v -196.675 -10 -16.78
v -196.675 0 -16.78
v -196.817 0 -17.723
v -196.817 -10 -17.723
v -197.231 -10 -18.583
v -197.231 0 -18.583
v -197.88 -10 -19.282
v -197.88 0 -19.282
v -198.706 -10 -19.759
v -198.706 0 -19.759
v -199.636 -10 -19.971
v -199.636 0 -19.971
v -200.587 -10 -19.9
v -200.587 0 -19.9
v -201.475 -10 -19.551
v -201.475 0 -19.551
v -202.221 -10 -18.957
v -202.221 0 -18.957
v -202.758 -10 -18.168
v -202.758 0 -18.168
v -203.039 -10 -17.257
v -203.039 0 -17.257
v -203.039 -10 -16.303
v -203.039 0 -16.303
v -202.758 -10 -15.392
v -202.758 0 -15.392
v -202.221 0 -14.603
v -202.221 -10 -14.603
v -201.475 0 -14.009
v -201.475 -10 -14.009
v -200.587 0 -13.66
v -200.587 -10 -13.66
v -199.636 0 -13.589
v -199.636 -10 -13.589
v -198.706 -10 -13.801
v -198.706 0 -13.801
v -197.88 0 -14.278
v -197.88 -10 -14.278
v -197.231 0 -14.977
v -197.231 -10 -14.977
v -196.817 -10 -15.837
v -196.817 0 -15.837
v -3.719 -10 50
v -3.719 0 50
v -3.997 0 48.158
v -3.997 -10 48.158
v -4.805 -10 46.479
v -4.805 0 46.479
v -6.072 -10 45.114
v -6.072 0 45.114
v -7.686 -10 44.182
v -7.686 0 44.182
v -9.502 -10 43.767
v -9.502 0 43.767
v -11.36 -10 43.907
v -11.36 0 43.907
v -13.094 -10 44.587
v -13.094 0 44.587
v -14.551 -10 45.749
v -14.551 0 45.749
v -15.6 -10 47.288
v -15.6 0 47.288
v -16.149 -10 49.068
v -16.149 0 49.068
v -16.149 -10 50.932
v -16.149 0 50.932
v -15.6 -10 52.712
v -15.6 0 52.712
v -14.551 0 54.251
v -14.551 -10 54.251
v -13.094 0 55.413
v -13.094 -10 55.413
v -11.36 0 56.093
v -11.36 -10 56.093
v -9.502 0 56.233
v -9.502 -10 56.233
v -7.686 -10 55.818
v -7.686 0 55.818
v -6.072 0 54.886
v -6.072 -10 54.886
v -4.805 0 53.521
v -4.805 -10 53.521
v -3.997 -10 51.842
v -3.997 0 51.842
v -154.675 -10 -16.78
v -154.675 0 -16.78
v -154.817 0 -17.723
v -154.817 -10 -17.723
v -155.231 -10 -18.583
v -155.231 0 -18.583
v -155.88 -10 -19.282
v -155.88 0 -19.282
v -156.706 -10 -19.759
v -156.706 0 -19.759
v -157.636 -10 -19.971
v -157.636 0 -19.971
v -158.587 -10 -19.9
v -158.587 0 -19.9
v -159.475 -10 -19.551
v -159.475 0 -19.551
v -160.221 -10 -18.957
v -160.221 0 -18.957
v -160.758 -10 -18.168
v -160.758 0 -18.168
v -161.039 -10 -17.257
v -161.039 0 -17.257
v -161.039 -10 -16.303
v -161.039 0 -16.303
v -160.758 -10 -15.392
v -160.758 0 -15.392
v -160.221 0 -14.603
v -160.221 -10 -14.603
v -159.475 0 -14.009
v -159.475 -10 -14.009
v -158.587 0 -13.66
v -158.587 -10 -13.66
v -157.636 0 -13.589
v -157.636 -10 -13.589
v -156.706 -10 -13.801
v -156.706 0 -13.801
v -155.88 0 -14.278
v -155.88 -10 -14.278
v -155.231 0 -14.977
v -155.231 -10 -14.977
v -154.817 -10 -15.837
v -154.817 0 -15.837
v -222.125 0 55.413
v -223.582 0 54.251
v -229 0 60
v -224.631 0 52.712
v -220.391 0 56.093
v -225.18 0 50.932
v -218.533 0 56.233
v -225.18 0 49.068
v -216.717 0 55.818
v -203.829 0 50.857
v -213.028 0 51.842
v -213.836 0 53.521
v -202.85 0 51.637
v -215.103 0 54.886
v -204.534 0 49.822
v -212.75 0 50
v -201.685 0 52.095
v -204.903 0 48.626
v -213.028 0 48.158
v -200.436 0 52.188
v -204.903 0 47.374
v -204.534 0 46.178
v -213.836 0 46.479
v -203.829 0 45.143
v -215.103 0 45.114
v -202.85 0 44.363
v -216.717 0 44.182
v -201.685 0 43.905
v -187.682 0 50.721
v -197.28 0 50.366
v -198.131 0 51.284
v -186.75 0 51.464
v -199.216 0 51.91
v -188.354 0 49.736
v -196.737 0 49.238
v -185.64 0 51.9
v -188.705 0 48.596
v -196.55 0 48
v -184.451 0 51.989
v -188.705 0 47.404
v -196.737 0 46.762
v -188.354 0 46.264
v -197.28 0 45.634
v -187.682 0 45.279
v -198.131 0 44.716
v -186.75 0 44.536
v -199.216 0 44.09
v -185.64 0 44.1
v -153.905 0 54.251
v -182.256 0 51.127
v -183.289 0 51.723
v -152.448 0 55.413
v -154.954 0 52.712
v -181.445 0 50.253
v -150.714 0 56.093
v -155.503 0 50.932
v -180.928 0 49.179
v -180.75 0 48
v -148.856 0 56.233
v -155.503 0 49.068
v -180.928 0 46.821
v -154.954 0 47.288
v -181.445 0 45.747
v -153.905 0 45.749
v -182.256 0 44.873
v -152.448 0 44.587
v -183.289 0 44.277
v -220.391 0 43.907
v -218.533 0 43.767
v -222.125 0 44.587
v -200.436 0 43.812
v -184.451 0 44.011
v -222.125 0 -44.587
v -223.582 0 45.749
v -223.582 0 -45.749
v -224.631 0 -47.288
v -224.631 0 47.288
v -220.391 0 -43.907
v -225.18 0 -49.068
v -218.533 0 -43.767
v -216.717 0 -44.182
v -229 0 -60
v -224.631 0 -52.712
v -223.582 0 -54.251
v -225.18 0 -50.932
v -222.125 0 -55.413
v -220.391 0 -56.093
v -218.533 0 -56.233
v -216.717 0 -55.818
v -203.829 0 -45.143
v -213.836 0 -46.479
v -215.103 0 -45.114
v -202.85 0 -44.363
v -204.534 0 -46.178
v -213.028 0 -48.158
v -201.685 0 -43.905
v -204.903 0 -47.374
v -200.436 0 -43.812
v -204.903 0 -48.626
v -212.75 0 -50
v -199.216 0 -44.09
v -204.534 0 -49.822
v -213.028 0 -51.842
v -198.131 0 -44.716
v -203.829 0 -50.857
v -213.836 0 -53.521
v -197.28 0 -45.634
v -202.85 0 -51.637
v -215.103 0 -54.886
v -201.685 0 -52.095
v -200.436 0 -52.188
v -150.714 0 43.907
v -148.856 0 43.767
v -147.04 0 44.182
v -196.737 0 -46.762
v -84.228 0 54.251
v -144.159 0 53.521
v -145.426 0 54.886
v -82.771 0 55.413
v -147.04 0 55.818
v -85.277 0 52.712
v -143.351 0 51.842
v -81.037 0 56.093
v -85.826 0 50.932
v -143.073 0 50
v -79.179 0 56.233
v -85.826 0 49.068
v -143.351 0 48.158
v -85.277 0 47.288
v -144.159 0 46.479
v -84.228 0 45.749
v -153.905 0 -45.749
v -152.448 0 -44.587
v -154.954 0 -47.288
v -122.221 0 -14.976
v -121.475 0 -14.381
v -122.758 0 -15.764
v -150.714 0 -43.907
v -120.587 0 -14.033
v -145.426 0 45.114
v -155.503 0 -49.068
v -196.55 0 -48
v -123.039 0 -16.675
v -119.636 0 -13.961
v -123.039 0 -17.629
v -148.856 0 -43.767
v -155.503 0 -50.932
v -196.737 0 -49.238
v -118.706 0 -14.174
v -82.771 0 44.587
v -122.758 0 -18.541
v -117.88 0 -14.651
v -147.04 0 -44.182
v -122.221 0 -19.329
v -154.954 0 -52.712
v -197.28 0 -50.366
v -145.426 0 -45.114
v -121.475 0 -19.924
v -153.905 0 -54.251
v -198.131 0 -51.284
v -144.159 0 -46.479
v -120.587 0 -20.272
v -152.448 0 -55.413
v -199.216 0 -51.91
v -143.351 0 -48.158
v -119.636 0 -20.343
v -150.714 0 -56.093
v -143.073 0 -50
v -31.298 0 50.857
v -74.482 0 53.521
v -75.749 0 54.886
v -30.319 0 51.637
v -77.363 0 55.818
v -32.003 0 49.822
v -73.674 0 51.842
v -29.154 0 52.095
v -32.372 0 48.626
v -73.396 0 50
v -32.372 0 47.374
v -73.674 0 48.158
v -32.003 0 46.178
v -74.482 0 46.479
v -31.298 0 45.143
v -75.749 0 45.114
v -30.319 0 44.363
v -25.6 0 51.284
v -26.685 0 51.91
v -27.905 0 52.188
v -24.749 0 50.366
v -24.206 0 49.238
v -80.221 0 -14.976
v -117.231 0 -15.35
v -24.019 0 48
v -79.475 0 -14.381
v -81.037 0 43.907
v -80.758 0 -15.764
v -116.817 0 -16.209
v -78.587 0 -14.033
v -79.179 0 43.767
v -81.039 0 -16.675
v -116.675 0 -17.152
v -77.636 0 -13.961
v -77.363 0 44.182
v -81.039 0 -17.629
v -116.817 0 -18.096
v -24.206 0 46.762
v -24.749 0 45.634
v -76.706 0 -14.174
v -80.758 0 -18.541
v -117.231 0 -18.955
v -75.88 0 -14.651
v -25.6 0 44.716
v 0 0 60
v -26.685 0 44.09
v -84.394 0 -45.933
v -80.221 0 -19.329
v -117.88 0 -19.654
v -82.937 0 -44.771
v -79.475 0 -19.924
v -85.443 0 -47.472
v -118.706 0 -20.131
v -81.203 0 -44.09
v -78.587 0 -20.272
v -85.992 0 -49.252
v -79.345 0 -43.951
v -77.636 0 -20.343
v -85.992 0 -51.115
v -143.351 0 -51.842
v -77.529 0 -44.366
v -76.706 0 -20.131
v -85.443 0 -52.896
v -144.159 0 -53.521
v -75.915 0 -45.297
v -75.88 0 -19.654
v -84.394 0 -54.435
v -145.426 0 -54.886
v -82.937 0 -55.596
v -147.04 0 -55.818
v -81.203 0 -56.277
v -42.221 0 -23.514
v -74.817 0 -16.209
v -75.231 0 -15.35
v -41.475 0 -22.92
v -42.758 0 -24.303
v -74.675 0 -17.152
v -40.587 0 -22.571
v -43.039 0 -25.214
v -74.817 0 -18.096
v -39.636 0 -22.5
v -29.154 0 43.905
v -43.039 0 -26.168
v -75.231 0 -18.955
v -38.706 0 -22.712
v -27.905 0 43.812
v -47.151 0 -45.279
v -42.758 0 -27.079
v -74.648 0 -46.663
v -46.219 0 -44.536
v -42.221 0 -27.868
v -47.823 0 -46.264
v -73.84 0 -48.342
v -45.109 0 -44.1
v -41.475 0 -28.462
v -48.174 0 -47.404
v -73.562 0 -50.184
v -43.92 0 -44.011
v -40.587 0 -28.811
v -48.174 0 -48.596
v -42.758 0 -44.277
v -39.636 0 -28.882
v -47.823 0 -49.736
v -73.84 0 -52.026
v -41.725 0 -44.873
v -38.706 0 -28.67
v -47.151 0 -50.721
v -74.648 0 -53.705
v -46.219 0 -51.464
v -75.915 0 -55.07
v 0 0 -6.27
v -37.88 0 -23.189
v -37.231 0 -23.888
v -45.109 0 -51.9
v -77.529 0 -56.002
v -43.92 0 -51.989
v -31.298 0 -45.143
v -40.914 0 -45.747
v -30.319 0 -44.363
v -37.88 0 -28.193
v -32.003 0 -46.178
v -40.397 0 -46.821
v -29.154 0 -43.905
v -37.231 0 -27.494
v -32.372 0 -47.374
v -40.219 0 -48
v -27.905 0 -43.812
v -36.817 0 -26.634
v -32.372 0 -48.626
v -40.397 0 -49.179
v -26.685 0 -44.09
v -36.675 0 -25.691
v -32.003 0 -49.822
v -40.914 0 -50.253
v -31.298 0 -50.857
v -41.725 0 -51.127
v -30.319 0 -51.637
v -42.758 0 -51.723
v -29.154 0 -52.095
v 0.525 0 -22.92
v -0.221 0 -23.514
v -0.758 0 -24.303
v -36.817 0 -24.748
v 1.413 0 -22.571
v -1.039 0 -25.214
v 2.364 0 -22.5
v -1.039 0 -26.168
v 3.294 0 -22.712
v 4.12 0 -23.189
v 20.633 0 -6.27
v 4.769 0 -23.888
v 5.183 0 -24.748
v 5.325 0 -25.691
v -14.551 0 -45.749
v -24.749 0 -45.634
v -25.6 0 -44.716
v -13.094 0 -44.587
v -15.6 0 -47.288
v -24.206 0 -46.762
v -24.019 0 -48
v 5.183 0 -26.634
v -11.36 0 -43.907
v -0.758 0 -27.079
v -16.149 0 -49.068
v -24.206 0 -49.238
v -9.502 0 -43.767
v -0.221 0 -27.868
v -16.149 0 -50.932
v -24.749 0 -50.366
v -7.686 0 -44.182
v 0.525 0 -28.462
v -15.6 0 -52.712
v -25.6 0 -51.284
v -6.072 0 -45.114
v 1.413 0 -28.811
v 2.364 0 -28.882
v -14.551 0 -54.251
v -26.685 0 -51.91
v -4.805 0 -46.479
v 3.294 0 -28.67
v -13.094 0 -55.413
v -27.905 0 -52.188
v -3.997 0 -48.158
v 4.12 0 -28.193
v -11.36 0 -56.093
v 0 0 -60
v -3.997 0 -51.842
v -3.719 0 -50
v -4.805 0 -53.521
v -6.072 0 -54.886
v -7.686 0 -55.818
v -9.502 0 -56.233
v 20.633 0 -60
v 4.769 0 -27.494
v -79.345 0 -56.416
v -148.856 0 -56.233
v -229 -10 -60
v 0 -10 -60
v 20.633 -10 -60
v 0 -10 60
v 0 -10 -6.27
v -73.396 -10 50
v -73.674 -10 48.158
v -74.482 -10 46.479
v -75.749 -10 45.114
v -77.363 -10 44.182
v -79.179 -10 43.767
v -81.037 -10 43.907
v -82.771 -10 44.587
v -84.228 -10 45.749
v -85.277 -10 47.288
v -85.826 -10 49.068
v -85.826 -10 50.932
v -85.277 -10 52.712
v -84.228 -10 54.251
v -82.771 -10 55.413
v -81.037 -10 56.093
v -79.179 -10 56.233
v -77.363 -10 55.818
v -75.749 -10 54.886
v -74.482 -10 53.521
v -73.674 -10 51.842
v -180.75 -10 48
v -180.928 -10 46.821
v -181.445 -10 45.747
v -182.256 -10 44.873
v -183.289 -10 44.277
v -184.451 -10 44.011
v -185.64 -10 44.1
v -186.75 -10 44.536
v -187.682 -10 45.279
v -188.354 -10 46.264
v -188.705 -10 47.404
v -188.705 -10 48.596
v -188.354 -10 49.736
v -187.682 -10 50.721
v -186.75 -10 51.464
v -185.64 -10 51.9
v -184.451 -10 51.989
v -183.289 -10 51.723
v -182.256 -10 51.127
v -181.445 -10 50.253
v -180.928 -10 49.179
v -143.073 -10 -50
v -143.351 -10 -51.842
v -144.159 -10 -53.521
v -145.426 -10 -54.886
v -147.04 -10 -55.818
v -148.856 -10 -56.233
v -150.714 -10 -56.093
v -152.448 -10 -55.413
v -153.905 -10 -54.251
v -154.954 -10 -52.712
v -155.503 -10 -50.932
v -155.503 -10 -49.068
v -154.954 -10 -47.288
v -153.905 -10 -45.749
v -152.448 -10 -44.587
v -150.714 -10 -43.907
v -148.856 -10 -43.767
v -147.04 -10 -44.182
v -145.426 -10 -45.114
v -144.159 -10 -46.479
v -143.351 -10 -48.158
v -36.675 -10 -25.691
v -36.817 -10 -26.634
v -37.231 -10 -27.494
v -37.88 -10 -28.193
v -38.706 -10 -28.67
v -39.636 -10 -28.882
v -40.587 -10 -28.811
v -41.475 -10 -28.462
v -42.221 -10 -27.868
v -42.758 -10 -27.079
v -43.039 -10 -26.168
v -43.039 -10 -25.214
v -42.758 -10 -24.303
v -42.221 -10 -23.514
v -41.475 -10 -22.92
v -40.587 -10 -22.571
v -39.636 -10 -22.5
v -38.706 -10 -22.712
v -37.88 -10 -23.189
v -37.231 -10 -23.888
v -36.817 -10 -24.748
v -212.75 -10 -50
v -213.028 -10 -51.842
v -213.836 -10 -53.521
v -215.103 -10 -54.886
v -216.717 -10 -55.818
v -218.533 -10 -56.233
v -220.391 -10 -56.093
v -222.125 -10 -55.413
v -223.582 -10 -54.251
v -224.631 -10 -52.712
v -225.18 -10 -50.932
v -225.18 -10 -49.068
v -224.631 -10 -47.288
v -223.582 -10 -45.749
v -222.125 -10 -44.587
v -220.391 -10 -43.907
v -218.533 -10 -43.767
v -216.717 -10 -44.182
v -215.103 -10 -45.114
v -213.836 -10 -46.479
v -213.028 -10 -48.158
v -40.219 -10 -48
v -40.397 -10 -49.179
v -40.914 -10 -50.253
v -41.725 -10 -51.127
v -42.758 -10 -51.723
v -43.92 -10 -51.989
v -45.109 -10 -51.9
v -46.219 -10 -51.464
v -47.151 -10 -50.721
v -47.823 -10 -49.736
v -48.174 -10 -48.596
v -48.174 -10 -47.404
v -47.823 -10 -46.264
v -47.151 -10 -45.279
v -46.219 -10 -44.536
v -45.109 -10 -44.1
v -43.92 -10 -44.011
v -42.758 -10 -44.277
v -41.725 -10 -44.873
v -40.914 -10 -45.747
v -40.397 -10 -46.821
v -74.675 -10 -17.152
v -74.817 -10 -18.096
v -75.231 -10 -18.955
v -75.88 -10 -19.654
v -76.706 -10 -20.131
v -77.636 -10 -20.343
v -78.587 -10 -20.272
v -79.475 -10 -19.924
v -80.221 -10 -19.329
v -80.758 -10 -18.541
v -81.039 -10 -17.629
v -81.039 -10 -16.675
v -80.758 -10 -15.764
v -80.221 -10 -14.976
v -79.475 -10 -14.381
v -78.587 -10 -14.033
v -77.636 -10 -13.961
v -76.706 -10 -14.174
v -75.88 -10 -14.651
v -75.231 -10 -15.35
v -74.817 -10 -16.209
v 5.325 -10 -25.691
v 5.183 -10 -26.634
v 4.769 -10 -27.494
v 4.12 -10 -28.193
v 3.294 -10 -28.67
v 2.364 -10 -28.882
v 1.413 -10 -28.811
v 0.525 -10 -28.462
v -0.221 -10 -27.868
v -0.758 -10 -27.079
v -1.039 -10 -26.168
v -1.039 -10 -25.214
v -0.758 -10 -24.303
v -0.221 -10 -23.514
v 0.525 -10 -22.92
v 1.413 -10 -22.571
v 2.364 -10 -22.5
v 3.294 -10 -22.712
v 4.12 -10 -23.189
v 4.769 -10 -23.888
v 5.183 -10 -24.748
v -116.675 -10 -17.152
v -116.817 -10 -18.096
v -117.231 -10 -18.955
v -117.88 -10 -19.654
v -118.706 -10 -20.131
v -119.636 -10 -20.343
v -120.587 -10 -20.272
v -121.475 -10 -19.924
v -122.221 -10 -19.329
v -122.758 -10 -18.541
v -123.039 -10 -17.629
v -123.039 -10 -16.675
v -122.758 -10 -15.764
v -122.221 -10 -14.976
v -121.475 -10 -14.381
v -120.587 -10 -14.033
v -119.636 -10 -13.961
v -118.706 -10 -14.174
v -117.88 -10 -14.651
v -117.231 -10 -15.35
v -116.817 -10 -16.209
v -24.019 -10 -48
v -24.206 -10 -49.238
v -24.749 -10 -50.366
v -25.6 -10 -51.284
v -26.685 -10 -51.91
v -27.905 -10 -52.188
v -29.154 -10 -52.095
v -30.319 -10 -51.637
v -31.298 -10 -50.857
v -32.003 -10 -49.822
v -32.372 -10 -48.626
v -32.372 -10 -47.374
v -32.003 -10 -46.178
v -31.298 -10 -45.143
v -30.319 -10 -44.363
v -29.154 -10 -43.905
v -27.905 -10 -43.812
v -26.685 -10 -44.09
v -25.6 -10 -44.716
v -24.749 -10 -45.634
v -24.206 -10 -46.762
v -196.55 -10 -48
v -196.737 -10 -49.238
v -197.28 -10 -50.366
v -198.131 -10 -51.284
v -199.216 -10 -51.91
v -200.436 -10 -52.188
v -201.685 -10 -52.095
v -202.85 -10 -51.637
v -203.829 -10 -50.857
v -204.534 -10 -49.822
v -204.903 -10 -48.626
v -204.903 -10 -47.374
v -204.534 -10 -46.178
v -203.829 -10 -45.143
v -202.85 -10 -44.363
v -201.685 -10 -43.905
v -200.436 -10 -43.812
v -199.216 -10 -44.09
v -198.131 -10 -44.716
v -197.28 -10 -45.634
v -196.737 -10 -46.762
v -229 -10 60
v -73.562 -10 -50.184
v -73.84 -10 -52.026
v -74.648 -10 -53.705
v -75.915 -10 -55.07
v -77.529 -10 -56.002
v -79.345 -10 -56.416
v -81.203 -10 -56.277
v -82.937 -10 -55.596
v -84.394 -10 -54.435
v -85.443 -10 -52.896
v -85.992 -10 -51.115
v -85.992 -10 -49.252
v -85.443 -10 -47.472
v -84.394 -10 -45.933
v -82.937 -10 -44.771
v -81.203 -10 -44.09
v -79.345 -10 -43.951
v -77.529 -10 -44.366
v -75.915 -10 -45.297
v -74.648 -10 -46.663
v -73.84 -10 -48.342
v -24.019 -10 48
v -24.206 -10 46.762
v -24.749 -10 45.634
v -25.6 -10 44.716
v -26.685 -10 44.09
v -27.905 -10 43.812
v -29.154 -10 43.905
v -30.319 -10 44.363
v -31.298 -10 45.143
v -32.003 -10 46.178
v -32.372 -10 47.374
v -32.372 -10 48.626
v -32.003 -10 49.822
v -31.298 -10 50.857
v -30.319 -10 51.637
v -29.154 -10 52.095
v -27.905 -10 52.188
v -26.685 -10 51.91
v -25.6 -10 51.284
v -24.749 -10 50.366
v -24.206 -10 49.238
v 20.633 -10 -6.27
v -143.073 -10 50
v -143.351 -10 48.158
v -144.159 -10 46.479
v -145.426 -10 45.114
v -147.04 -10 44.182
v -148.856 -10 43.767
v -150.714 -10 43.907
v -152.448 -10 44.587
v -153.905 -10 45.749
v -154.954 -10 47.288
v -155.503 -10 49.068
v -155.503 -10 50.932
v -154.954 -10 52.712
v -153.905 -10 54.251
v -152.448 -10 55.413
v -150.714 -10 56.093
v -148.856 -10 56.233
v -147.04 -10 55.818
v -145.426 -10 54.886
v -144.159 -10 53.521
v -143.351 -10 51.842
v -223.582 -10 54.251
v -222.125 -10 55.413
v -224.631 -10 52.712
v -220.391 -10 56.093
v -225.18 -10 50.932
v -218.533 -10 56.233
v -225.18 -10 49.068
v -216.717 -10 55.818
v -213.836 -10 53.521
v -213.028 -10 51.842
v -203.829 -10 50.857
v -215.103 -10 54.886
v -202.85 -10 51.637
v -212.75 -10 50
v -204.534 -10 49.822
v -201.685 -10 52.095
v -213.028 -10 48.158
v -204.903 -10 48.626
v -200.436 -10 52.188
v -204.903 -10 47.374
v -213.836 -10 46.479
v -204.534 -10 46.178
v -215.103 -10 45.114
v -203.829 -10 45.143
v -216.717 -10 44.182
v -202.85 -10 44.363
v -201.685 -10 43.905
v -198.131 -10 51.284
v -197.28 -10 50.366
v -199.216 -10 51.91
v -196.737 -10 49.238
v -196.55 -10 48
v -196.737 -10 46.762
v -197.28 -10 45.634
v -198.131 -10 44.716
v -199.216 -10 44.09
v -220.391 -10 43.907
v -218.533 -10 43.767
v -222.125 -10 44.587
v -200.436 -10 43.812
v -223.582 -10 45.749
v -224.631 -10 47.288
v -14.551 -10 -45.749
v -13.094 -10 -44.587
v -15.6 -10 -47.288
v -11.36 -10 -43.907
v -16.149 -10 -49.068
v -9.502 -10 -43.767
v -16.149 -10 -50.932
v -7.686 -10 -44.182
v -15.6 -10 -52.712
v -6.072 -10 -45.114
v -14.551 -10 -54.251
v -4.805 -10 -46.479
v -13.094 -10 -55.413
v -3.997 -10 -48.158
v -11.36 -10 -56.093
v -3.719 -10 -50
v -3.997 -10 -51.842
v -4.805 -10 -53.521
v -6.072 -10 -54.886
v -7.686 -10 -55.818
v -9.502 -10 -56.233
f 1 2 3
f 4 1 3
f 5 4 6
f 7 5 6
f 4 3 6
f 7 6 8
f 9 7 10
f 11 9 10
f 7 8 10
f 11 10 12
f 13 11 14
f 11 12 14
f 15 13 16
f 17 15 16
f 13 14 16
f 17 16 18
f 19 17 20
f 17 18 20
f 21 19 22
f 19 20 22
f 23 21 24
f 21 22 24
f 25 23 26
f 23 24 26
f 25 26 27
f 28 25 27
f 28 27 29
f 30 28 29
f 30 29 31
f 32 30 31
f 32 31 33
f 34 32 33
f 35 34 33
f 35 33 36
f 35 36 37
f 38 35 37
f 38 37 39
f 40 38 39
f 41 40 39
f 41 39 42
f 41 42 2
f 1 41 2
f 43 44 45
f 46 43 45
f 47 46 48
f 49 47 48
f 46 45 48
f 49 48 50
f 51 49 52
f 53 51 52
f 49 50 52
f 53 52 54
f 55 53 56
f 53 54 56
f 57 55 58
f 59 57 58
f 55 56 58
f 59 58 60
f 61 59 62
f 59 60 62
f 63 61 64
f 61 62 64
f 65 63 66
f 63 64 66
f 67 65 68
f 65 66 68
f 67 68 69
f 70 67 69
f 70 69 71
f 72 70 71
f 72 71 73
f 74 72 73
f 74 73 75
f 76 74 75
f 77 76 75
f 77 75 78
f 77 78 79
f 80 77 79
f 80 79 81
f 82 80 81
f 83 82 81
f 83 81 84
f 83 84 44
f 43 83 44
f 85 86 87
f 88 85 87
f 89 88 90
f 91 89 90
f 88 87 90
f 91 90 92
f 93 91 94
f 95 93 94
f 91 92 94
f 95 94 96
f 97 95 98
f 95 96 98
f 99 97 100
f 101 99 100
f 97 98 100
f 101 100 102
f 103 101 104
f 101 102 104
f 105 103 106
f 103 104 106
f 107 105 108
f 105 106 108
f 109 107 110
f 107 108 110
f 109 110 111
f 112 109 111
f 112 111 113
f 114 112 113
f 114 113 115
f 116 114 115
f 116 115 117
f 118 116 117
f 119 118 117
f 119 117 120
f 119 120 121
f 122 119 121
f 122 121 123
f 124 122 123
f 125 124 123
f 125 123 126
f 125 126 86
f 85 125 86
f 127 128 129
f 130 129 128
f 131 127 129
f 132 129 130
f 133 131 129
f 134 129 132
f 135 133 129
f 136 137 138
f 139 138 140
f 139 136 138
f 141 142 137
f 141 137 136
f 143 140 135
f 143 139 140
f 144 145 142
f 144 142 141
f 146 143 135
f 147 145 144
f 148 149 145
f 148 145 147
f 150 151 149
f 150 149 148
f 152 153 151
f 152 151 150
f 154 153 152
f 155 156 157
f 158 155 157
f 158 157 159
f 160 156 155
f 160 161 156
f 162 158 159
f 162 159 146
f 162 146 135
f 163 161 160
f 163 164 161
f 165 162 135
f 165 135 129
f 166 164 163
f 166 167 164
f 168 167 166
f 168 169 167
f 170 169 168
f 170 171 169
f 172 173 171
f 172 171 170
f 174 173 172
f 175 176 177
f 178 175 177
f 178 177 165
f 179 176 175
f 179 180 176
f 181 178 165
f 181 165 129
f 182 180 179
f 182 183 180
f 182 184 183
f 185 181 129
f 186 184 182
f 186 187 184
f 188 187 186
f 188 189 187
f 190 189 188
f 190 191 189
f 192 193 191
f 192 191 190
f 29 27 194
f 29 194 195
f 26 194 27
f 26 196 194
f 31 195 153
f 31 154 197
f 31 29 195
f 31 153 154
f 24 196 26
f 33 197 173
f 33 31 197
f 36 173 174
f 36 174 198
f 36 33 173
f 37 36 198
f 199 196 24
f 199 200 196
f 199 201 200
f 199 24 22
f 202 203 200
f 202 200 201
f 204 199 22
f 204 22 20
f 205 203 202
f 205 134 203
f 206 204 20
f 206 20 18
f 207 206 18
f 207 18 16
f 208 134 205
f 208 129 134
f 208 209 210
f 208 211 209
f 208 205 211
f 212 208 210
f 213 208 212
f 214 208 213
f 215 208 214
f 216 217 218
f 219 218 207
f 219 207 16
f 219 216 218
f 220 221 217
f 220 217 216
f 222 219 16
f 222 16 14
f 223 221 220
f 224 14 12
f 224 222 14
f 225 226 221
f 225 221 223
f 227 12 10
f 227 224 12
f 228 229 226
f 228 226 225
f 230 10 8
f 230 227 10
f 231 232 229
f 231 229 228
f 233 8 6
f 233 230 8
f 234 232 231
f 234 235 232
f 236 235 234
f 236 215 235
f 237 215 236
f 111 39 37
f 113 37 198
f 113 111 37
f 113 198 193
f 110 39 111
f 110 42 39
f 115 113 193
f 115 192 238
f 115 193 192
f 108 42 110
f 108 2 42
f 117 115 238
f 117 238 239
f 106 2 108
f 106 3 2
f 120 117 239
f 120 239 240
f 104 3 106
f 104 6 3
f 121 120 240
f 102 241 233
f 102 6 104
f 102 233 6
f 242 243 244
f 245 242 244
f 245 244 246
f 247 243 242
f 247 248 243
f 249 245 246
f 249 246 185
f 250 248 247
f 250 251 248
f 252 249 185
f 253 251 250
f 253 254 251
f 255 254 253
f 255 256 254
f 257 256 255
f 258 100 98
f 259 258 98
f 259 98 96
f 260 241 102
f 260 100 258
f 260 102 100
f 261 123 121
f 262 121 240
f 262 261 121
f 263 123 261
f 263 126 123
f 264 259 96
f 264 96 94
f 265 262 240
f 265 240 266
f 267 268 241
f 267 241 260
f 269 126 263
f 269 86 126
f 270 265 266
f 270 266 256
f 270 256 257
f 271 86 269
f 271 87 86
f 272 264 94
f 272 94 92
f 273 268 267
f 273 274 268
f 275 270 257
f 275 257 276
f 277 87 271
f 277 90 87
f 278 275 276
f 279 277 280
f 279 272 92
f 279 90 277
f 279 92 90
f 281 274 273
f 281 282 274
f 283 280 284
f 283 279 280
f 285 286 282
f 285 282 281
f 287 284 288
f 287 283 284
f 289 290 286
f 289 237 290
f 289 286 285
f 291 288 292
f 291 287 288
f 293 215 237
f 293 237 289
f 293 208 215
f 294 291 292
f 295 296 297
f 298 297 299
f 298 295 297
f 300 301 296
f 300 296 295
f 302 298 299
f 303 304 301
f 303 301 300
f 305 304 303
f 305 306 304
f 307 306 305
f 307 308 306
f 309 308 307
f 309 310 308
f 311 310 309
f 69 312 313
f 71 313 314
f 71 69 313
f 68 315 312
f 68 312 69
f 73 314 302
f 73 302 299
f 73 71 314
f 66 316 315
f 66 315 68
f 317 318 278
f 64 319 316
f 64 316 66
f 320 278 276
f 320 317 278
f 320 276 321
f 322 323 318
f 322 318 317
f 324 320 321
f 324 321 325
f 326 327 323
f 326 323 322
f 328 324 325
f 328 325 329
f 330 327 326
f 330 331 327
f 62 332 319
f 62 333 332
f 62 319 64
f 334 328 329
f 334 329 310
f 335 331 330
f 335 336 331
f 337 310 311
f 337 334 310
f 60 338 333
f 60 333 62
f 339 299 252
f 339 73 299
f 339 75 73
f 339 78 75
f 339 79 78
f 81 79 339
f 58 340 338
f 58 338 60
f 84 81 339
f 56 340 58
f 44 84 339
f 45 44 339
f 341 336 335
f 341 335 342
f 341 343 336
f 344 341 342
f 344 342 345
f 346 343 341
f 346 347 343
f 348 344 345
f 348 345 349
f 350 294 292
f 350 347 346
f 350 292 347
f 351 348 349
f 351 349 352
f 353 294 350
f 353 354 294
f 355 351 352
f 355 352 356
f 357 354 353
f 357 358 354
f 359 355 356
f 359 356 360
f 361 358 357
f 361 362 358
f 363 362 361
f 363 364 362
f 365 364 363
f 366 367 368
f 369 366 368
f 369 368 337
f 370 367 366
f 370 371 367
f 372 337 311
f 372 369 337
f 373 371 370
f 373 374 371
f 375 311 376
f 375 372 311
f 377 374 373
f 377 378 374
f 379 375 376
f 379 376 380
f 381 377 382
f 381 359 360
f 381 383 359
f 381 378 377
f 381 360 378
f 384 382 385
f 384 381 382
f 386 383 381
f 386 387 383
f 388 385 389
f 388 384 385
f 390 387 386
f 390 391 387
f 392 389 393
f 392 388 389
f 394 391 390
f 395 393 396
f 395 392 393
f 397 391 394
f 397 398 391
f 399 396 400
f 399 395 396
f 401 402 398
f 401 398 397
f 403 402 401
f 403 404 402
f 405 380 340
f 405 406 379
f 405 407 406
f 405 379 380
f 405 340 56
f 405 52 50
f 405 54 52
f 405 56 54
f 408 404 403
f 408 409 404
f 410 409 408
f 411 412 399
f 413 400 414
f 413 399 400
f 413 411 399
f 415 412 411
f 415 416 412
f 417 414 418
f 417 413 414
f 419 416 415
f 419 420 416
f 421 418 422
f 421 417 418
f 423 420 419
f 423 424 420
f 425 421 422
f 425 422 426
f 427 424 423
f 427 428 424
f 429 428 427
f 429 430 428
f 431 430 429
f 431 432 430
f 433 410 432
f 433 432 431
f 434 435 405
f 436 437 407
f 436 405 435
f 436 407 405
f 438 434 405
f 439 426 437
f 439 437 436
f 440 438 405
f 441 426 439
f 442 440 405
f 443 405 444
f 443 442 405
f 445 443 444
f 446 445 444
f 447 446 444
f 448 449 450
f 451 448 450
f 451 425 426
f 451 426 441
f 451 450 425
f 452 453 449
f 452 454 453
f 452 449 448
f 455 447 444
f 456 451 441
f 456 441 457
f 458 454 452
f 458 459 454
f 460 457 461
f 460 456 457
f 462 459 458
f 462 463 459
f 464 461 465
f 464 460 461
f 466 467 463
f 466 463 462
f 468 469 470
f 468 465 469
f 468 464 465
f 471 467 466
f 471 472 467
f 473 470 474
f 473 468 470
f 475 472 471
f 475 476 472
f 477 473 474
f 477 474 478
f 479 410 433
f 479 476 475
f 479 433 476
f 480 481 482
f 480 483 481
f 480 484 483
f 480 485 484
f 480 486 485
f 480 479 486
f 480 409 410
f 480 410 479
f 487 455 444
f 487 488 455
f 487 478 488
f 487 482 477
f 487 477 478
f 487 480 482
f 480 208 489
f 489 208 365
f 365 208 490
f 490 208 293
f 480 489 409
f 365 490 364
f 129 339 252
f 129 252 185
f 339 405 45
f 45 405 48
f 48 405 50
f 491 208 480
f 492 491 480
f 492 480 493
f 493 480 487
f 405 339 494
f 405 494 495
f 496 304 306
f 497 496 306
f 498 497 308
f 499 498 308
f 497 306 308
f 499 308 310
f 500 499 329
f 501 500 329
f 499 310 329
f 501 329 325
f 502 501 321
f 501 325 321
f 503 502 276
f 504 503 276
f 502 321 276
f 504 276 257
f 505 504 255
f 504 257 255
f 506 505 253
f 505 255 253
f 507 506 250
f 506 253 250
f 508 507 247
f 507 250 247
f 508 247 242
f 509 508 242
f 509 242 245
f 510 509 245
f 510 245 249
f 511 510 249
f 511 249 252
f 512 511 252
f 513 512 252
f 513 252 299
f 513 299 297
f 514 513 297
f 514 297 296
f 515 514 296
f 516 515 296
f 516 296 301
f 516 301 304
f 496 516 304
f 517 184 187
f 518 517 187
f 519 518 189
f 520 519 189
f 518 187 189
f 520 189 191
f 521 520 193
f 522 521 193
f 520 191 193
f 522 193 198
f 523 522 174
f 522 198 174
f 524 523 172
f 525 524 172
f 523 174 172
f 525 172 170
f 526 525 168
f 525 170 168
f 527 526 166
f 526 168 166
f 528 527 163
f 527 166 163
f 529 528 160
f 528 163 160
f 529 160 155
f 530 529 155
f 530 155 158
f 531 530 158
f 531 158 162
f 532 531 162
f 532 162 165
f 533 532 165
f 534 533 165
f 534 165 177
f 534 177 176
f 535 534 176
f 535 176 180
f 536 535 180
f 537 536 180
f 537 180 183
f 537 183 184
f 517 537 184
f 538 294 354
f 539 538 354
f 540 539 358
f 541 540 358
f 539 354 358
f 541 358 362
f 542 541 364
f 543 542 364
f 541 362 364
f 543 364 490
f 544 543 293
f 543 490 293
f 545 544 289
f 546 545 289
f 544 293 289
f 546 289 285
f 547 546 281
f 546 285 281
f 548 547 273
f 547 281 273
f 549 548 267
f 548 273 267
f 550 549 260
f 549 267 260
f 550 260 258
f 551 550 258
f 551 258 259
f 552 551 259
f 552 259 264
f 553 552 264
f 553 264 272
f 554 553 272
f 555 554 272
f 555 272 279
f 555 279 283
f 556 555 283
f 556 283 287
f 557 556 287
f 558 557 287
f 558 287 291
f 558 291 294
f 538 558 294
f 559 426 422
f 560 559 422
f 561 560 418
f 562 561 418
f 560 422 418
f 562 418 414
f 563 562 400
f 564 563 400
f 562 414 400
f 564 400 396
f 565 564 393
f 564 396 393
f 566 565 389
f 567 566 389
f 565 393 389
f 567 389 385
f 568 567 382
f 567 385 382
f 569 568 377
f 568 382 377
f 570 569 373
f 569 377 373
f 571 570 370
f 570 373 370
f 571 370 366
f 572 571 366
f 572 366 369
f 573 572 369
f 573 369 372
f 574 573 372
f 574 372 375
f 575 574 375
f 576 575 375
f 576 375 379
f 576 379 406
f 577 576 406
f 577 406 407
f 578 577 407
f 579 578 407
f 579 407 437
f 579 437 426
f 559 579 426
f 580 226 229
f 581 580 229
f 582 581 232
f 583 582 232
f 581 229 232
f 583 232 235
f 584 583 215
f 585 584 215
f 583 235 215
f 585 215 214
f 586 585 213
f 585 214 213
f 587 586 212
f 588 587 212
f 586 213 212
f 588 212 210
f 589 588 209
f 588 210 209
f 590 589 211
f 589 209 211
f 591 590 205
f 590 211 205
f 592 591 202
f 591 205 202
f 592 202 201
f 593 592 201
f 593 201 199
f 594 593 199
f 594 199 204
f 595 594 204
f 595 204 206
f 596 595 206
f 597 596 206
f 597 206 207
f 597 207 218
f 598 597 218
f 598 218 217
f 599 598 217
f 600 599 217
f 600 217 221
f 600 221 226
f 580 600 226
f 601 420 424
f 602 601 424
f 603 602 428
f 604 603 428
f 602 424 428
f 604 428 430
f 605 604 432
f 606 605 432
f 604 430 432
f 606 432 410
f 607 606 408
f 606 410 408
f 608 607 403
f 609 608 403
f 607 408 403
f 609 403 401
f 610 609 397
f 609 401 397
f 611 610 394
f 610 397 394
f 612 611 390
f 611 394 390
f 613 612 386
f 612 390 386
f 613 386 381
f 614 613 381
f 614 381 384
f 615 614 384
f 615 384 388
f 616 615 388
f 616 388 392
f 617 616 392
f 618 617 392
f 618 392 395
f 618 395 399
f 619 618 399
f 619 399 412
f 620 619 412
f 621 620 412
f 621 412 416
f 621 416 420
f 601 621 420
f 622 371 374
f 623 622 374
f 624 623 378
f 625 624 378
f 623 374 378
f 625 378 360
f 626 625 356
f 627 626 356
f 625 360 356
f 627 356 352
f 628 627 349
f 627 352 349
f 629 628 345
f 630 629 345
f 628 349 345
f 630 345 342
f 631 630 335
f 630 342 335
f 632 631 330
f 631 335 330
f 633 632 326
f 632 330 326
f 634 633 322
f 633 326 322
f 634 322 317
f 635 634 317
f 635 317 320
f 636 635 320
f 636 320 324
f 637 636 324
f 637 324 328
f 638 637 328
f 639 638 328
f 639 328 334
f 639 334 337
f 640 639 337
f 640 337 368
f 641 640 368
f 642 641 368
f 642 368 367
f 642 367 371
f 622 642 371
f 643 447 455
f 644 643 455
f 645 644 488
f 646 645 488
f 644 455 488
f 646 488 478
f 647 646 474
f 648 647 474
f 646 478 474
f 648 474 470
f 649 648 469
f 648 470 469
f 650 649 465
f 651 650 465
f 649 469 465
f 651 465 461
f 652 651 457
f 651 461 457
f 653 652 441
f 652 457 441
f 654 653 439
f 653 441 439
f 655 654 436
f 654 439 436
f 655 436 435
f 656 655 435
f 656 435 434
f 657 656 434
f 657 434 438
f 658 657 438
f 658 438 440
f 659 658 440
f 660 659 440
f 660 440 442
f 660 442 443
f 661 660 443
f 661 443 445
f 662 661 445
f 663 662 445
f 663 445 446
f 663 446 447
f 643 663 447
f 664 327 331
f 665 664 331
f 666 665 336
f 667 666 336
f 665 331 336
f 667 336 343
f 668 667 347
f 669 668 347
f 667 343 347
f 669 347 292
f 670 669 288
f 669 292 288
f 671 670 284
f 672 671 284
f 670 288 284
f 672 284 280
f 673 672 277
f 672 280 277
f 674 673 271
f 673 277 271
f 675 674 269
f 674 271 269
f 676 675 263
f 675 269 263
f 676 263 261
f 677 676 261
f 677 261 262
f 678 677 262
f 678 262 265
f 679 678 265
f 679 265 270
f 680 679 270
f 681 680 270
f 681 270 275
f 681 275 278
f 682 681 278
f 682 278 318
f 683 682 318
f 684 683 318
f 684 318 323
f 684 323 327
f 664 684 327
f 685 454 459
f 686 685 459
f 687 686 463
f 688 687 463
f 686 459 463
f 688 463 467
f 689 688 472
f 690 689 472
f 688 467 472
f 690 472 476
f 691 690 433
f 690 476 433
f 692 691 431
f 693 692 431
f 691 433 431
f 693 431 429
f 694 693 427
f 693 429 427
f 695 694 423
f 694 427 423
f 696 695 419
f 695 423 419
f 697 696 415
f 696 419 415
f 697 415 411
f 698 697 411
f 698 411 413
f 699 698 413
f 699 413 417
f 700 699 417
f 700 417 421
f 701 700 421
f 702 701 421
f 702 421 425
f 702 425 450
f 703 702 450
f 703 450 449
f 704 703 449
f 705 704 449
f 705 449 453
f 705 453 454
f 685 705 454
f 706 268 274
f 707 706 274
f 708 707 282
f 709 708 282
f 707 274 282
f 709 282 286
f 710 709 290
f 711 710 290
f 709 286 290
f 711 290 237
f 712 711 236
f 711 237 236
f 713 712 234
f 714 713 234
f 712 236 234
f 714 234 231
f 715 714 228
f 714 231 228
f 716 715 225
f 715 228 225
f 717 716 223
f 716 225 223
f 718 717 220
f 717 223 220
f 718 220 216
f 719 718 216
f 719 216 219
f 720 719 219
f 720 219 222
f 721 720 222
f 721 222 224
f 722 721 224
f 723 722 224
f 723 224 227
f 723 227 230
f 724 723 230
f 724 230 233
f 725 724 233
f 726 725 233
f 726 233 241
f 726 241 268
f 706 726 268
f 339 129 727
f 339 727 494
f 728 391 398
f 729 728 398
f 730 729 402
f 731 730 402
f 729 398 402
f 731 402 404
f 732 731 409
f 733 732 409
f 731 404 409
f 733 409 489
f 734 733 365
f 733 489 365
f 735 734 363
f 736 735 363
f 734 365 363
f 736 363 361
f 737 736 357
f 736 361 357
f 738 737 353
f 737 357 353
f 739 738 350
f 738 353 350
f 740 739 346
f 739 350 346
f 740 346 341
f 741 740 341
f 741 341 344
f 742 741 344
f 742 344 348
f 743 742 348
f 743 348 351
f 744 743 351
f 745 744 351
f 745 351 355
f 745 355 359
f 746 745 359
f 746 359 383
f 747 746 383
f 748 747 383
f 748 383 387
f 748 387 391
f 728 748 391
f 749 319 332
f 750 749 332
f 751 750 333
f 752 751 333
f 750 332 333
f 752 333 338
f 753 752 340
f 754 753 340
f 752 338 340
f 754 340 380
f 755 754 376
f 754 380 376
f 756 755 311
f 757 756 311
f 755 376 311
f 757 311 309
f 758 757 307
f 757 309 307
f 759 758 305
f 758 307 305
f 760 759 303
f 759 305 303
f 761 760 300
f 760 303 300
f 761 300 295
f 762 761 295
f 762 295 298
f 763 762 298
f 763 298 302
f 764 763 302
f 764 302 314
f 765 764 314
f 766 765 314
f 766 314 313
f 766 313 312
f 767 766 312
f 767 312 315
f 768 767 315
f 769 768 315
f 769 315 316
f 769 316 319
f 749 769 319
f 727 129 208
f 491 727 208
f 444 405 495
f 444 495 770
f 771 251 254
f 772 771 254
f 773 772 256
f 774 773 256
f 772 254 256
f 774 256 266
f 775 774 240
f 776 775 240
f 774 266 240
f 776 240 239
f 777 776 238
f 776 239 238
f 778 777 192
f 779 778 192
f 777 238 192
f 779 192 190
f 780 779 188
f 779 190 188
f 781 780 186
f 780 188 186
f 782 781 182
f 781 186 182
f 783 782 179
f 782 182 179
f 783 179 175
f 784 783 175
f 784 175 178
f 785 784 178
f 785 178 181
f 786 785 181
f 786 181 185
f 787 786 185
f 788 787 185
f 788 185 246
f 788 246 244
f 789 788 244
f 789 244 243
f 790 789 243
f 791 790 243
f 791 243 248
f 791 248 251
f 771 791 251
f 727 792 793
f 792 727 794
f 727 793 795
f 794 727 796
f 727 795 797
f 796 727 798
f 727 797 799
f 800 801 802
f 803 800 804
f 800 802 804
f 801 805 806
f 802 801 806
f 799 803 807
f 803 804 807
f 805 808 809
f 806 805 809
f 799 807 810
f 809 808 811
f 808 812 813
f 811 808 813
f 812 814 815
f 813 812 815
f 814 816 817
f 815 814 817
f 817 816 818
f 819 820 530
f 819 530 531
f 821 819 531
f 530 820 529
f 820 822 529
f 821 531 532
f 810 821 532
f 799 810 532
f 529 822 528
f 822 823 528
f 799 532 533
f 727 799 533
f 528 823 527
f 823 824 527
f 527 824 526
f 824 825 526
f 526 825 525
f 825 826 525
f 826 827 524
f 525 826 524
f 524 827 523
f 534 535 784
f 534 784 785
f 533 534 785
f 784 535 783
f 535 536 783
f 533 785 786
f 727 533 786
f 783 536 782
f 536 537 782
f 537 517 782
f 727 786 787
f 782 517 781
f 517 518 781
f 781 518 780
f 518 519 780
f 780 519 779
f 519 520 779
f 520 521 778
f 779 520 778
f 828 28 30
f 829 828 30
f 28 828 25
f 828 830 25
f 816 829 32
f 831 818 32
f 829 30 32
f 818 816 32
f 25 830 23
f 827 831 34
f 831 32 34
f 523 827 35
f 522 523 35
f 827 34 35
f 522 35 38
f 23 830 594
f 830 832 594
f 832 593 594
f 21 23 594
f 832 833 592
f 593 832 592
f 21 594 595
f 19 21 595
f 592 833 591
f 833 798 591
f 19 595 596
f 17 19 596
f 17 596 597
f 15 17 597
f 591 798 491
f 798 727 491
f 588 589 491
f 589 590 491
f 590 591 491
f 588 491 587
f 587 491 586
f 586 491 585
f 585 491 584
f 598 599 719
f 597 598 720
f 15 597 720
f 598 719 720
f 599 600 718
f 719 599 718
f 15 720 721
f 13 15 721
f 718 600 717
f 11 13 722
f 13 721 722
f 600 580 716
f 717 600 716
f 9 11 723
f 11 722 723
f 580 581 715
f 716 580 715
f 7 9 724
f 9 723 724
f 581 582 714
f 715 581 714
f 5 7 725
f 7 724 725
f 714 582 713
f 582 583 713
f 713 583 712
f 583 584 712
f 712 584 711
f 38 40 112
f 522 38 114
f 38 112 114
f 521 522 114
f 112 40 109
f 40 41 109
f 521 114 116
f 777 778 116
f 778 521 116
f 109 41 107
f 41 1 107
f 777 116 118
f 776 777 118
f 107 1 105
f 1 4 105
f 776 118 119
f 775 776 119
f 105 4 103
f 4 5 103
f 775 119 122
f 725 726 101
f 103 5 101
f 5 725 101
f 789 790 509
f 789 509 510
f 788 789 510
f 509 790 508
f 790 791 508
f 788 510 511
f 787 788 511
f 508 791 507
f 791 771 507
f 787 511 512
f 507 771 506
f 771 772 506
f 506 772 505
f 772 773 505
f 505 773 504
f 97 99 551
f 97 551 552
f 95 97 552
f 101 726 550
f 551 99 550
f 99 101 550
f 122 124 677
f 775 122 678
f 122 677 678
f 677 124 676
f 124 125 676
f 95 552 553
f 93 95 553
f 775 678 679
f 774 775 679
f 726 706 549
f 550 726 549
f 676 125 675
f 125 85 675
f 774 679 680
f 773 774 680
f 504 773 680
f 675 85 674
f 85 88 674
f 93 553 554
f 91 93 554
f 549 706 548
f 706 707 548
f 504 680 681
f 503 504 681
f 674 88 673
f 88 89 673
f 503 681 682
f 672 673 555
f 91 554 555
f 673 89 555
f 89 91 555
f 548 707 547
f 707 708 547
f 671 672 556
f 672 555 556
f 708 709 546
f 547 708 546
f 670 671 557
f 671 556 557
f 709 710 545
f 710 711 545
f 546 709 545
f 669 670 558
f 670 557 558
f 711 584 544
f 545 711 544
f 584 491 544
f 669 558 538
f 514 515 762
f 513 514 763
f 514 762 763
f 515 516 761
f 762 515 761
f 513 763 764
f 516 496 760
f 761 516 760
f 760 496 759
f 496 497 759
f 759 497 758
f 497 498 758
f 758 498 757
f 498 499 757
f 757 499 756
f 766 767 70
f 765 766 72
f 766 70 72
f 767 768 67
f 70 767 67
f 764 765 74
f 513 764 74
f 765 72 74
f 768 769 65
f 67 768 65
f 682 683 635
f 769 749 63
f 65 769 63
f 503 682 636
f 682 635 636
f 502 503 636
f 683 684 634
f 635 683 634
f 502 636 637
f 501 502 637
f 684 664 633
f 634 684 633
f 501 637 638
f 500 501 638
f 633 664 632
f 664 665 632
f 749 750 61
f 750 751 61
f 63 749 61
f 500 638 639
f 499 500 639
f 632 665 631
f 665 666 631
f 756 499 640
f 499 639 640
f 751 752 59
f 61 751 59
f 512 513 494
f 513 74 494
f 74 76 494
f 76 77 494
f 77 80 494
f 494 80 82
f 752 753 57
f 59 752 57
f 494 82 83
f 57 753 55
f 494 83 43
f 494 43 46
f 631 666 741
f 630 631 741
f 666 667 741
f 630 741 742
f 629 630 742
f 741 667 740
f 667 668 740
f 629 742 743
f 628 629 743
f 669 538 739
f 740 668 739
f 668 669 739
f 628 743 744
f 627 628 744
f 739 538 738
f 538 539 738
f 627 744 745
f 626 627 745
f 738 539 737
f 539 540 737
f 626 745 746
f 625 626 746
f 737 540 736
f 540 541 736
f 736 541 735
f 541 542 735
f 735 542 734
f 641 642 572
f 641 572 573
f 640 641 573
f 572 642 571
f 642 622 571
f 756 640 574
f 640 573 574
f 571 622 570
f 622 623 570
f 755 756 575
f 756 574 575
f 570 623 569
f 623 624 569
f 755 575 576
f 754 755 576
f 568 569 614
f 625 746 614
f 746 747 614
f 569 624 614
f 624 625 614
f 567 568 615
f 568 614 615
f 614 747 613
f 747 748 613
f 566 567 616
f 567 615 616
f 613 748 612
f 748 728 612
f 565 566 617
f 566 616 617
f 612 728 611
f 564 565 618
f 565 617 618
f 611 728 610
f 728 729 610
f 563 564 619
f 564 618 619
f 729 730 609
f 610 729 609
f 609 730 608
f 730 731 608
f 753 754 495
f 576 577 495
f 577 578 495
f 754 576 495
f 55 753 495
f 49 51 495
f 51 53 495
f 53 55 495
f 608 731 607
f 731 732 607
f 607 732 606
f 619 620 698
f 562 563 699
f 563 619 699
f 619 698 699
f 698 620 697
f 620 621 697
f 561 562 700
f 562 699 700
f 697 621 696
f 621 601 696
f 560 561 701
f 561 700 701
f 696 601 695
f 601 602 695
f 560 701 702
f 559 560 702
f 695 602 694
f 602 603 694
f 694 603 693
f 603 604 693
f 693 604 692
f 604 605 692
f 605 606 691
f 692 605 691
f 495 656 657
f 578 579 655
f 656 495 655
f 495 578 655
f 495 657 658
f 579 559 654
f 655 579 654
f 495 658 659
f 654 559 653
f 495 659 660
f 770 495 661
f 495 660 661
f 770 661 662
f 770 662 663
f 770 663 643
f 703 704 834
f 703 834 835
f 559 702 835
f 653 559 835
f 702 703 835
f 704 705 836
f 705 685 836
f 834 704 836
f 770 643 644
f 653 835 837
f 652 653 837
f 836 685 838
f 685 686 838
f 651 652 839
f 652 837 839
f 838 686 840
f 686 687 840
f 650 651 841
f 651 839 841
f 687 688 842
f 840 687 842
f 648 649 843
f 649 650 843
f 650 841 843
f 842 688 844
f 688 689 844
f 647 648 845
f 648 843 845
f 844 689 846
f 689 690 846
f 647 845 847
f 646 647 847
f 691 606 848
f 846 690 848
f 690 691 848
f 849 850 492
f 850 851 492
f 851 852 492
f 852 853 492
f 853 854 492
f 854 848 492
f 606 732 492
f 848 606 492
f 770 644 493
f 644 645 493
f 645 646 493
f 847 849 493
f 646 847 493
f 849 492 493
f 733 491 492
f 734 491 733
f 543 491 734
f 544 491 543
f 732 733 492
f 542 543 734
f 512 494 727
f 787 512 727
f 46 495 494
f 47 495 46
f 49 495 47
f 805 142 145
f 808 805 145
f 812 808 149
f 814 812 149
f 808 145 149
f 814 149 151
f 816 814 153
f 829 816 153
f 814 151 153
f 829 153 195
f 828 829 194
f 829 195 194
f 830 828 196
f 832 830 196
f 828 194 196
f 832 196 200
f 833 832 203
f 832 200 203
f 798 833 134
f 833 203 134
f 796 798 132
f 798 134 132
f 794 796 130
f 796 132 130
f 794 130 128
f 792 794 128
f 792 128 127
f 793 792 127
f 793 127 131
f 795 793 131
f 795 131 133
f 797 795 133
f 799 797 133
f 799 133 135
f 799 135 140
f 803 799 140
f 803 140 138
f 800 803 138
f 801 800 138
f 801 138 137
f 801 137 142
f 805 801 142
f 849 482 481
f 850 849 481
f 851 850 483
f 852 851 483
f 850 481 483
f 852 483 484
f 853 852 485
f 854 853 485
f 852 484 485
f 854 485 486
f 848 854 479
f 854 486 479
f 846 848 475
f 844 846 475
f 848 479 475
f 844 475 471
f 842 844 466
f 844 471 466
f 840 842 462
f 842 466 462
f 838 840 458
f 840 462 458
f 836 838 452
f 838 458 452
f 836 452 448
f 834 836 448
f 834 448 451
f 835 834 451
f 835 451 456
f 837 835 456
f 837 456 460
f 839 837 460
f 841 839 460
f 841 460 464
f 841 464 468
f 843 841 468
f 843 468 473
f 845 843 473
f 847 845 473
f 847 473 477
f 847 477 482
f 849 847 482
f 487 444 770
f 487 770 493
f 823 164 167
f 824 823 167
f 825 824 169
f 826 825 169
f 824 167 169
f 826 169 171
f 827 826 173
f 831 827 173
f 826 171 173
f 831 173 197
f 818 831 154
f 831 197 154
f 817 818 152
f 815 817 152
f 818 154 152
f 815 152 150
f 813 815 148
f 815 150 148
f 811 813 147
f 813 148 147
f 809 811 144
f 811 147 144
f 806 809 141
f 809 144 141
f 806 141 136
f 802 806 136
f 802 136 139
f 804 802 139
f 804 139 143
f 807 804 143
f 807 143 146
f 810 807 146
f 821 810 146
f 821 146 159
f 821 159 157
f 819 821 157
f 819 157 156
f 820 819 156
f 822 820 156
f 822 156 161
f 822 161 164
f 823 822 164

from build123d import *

# Parameters (mm, degrees)
SKETCH1_W                    = 229
SKETCH1_H                    = 120
BOSS_EXTRUDE1_DEPTH          = 10
SKETCH2_W                    = 20.632503002
SKETCH2_H                    = 53.730004003
BOSS_EXTRUDE2_DEPTH          = 10
F_12_5_12_5_DIAMETER_HOLE1_D = 12.5
M6_CLEARANCE_HOLE1_D         = 6.4
F_8_0MM_DOWEL_HOLE1_D        = 8
M8_CLEARANCE_HOLE1_D         = 8.4


with BuildPart() as part:
    # Sketch1 → Boss-Extrude1 (new body)
    with BuildSketch(Plane(origin=(0, 0, 0), x_dir=(1, 0, 0), z_dir=(0, 1, 0))):
        with Locations((-114.5, 0)):
            Rectangle(SKETCH1_W, SKETCH1_H)
    extrude(amount=-BOSS_EXTRUDE1_DEPTH)

    # Sketch2 → Boss-Extrude2 (add)
    with BuildSketch(Plane(origin=(0, 0, 0), x_dir=(1, 0, 0), z_dir=(0, 1, 0))):
        with Locations((10.316251501, 33.134997999)):
            Rectangle(SKETCH2_W, SKETCH2_H)
    extrude(amount=-BOSS_EXTRUDE2_DEPTH)

    # Ø12.5 (12.5) Diameter Hole1 (through all)
    with Locations(Plane(origin=(0, -10, 0), x_dir=(-1, 0, 0), z_dir=(0, -1, 0))):
        with Locations((9.969, 50), (79.812013925, 50.183768679), (149.323, 50), (219, 50), (219, -50), (149.323, -50), (79.646, -50), (9.969, -50)):
            Hole(F_12_5_12_5_DIAMETER_HOLE1_D / 2)

    # M6 Clearance Hole1 (through all)
    with Locations(Plane(origin=(0, -10, 0), x_dir=(-1, 0, 0), z_dir=(0, -1, 0))):
        with Locations((-2.125, 25.691000385), (39.875, 25.691000385), (77.875, 17.152366083), (119.875, 17.152366083), (157.875, 16.78), (199.875, 16.78)):
            Hole(M6_CLEARANCE_HOLE1_D / 2)

    # Ø8.0mm Dowel Hole1 (through all)
    with Locations(Plane(origin=(0, -10, 0), x_dir=(-1, 0, 0), z_dir=(0, -1, 0))):
        with Locations((184.75, -48), (44.219, 48)):
            Hole(F_8_0MM_DOWEL_HOLE1_D / 2)

    # M8 Clearance Hole1 (through all)
    with Locations(Plane(origin=(0, -10, 0), x_dir=(-1, 0, 0), z_dir=(0, -1, 0))):
        with Locations((28.219, 48), (200.75, 48), (200.75, -48), (28.219, -48)):
            Hole(M8_CLEARANCE_HOLE1_D / 2)


solid = part.part
